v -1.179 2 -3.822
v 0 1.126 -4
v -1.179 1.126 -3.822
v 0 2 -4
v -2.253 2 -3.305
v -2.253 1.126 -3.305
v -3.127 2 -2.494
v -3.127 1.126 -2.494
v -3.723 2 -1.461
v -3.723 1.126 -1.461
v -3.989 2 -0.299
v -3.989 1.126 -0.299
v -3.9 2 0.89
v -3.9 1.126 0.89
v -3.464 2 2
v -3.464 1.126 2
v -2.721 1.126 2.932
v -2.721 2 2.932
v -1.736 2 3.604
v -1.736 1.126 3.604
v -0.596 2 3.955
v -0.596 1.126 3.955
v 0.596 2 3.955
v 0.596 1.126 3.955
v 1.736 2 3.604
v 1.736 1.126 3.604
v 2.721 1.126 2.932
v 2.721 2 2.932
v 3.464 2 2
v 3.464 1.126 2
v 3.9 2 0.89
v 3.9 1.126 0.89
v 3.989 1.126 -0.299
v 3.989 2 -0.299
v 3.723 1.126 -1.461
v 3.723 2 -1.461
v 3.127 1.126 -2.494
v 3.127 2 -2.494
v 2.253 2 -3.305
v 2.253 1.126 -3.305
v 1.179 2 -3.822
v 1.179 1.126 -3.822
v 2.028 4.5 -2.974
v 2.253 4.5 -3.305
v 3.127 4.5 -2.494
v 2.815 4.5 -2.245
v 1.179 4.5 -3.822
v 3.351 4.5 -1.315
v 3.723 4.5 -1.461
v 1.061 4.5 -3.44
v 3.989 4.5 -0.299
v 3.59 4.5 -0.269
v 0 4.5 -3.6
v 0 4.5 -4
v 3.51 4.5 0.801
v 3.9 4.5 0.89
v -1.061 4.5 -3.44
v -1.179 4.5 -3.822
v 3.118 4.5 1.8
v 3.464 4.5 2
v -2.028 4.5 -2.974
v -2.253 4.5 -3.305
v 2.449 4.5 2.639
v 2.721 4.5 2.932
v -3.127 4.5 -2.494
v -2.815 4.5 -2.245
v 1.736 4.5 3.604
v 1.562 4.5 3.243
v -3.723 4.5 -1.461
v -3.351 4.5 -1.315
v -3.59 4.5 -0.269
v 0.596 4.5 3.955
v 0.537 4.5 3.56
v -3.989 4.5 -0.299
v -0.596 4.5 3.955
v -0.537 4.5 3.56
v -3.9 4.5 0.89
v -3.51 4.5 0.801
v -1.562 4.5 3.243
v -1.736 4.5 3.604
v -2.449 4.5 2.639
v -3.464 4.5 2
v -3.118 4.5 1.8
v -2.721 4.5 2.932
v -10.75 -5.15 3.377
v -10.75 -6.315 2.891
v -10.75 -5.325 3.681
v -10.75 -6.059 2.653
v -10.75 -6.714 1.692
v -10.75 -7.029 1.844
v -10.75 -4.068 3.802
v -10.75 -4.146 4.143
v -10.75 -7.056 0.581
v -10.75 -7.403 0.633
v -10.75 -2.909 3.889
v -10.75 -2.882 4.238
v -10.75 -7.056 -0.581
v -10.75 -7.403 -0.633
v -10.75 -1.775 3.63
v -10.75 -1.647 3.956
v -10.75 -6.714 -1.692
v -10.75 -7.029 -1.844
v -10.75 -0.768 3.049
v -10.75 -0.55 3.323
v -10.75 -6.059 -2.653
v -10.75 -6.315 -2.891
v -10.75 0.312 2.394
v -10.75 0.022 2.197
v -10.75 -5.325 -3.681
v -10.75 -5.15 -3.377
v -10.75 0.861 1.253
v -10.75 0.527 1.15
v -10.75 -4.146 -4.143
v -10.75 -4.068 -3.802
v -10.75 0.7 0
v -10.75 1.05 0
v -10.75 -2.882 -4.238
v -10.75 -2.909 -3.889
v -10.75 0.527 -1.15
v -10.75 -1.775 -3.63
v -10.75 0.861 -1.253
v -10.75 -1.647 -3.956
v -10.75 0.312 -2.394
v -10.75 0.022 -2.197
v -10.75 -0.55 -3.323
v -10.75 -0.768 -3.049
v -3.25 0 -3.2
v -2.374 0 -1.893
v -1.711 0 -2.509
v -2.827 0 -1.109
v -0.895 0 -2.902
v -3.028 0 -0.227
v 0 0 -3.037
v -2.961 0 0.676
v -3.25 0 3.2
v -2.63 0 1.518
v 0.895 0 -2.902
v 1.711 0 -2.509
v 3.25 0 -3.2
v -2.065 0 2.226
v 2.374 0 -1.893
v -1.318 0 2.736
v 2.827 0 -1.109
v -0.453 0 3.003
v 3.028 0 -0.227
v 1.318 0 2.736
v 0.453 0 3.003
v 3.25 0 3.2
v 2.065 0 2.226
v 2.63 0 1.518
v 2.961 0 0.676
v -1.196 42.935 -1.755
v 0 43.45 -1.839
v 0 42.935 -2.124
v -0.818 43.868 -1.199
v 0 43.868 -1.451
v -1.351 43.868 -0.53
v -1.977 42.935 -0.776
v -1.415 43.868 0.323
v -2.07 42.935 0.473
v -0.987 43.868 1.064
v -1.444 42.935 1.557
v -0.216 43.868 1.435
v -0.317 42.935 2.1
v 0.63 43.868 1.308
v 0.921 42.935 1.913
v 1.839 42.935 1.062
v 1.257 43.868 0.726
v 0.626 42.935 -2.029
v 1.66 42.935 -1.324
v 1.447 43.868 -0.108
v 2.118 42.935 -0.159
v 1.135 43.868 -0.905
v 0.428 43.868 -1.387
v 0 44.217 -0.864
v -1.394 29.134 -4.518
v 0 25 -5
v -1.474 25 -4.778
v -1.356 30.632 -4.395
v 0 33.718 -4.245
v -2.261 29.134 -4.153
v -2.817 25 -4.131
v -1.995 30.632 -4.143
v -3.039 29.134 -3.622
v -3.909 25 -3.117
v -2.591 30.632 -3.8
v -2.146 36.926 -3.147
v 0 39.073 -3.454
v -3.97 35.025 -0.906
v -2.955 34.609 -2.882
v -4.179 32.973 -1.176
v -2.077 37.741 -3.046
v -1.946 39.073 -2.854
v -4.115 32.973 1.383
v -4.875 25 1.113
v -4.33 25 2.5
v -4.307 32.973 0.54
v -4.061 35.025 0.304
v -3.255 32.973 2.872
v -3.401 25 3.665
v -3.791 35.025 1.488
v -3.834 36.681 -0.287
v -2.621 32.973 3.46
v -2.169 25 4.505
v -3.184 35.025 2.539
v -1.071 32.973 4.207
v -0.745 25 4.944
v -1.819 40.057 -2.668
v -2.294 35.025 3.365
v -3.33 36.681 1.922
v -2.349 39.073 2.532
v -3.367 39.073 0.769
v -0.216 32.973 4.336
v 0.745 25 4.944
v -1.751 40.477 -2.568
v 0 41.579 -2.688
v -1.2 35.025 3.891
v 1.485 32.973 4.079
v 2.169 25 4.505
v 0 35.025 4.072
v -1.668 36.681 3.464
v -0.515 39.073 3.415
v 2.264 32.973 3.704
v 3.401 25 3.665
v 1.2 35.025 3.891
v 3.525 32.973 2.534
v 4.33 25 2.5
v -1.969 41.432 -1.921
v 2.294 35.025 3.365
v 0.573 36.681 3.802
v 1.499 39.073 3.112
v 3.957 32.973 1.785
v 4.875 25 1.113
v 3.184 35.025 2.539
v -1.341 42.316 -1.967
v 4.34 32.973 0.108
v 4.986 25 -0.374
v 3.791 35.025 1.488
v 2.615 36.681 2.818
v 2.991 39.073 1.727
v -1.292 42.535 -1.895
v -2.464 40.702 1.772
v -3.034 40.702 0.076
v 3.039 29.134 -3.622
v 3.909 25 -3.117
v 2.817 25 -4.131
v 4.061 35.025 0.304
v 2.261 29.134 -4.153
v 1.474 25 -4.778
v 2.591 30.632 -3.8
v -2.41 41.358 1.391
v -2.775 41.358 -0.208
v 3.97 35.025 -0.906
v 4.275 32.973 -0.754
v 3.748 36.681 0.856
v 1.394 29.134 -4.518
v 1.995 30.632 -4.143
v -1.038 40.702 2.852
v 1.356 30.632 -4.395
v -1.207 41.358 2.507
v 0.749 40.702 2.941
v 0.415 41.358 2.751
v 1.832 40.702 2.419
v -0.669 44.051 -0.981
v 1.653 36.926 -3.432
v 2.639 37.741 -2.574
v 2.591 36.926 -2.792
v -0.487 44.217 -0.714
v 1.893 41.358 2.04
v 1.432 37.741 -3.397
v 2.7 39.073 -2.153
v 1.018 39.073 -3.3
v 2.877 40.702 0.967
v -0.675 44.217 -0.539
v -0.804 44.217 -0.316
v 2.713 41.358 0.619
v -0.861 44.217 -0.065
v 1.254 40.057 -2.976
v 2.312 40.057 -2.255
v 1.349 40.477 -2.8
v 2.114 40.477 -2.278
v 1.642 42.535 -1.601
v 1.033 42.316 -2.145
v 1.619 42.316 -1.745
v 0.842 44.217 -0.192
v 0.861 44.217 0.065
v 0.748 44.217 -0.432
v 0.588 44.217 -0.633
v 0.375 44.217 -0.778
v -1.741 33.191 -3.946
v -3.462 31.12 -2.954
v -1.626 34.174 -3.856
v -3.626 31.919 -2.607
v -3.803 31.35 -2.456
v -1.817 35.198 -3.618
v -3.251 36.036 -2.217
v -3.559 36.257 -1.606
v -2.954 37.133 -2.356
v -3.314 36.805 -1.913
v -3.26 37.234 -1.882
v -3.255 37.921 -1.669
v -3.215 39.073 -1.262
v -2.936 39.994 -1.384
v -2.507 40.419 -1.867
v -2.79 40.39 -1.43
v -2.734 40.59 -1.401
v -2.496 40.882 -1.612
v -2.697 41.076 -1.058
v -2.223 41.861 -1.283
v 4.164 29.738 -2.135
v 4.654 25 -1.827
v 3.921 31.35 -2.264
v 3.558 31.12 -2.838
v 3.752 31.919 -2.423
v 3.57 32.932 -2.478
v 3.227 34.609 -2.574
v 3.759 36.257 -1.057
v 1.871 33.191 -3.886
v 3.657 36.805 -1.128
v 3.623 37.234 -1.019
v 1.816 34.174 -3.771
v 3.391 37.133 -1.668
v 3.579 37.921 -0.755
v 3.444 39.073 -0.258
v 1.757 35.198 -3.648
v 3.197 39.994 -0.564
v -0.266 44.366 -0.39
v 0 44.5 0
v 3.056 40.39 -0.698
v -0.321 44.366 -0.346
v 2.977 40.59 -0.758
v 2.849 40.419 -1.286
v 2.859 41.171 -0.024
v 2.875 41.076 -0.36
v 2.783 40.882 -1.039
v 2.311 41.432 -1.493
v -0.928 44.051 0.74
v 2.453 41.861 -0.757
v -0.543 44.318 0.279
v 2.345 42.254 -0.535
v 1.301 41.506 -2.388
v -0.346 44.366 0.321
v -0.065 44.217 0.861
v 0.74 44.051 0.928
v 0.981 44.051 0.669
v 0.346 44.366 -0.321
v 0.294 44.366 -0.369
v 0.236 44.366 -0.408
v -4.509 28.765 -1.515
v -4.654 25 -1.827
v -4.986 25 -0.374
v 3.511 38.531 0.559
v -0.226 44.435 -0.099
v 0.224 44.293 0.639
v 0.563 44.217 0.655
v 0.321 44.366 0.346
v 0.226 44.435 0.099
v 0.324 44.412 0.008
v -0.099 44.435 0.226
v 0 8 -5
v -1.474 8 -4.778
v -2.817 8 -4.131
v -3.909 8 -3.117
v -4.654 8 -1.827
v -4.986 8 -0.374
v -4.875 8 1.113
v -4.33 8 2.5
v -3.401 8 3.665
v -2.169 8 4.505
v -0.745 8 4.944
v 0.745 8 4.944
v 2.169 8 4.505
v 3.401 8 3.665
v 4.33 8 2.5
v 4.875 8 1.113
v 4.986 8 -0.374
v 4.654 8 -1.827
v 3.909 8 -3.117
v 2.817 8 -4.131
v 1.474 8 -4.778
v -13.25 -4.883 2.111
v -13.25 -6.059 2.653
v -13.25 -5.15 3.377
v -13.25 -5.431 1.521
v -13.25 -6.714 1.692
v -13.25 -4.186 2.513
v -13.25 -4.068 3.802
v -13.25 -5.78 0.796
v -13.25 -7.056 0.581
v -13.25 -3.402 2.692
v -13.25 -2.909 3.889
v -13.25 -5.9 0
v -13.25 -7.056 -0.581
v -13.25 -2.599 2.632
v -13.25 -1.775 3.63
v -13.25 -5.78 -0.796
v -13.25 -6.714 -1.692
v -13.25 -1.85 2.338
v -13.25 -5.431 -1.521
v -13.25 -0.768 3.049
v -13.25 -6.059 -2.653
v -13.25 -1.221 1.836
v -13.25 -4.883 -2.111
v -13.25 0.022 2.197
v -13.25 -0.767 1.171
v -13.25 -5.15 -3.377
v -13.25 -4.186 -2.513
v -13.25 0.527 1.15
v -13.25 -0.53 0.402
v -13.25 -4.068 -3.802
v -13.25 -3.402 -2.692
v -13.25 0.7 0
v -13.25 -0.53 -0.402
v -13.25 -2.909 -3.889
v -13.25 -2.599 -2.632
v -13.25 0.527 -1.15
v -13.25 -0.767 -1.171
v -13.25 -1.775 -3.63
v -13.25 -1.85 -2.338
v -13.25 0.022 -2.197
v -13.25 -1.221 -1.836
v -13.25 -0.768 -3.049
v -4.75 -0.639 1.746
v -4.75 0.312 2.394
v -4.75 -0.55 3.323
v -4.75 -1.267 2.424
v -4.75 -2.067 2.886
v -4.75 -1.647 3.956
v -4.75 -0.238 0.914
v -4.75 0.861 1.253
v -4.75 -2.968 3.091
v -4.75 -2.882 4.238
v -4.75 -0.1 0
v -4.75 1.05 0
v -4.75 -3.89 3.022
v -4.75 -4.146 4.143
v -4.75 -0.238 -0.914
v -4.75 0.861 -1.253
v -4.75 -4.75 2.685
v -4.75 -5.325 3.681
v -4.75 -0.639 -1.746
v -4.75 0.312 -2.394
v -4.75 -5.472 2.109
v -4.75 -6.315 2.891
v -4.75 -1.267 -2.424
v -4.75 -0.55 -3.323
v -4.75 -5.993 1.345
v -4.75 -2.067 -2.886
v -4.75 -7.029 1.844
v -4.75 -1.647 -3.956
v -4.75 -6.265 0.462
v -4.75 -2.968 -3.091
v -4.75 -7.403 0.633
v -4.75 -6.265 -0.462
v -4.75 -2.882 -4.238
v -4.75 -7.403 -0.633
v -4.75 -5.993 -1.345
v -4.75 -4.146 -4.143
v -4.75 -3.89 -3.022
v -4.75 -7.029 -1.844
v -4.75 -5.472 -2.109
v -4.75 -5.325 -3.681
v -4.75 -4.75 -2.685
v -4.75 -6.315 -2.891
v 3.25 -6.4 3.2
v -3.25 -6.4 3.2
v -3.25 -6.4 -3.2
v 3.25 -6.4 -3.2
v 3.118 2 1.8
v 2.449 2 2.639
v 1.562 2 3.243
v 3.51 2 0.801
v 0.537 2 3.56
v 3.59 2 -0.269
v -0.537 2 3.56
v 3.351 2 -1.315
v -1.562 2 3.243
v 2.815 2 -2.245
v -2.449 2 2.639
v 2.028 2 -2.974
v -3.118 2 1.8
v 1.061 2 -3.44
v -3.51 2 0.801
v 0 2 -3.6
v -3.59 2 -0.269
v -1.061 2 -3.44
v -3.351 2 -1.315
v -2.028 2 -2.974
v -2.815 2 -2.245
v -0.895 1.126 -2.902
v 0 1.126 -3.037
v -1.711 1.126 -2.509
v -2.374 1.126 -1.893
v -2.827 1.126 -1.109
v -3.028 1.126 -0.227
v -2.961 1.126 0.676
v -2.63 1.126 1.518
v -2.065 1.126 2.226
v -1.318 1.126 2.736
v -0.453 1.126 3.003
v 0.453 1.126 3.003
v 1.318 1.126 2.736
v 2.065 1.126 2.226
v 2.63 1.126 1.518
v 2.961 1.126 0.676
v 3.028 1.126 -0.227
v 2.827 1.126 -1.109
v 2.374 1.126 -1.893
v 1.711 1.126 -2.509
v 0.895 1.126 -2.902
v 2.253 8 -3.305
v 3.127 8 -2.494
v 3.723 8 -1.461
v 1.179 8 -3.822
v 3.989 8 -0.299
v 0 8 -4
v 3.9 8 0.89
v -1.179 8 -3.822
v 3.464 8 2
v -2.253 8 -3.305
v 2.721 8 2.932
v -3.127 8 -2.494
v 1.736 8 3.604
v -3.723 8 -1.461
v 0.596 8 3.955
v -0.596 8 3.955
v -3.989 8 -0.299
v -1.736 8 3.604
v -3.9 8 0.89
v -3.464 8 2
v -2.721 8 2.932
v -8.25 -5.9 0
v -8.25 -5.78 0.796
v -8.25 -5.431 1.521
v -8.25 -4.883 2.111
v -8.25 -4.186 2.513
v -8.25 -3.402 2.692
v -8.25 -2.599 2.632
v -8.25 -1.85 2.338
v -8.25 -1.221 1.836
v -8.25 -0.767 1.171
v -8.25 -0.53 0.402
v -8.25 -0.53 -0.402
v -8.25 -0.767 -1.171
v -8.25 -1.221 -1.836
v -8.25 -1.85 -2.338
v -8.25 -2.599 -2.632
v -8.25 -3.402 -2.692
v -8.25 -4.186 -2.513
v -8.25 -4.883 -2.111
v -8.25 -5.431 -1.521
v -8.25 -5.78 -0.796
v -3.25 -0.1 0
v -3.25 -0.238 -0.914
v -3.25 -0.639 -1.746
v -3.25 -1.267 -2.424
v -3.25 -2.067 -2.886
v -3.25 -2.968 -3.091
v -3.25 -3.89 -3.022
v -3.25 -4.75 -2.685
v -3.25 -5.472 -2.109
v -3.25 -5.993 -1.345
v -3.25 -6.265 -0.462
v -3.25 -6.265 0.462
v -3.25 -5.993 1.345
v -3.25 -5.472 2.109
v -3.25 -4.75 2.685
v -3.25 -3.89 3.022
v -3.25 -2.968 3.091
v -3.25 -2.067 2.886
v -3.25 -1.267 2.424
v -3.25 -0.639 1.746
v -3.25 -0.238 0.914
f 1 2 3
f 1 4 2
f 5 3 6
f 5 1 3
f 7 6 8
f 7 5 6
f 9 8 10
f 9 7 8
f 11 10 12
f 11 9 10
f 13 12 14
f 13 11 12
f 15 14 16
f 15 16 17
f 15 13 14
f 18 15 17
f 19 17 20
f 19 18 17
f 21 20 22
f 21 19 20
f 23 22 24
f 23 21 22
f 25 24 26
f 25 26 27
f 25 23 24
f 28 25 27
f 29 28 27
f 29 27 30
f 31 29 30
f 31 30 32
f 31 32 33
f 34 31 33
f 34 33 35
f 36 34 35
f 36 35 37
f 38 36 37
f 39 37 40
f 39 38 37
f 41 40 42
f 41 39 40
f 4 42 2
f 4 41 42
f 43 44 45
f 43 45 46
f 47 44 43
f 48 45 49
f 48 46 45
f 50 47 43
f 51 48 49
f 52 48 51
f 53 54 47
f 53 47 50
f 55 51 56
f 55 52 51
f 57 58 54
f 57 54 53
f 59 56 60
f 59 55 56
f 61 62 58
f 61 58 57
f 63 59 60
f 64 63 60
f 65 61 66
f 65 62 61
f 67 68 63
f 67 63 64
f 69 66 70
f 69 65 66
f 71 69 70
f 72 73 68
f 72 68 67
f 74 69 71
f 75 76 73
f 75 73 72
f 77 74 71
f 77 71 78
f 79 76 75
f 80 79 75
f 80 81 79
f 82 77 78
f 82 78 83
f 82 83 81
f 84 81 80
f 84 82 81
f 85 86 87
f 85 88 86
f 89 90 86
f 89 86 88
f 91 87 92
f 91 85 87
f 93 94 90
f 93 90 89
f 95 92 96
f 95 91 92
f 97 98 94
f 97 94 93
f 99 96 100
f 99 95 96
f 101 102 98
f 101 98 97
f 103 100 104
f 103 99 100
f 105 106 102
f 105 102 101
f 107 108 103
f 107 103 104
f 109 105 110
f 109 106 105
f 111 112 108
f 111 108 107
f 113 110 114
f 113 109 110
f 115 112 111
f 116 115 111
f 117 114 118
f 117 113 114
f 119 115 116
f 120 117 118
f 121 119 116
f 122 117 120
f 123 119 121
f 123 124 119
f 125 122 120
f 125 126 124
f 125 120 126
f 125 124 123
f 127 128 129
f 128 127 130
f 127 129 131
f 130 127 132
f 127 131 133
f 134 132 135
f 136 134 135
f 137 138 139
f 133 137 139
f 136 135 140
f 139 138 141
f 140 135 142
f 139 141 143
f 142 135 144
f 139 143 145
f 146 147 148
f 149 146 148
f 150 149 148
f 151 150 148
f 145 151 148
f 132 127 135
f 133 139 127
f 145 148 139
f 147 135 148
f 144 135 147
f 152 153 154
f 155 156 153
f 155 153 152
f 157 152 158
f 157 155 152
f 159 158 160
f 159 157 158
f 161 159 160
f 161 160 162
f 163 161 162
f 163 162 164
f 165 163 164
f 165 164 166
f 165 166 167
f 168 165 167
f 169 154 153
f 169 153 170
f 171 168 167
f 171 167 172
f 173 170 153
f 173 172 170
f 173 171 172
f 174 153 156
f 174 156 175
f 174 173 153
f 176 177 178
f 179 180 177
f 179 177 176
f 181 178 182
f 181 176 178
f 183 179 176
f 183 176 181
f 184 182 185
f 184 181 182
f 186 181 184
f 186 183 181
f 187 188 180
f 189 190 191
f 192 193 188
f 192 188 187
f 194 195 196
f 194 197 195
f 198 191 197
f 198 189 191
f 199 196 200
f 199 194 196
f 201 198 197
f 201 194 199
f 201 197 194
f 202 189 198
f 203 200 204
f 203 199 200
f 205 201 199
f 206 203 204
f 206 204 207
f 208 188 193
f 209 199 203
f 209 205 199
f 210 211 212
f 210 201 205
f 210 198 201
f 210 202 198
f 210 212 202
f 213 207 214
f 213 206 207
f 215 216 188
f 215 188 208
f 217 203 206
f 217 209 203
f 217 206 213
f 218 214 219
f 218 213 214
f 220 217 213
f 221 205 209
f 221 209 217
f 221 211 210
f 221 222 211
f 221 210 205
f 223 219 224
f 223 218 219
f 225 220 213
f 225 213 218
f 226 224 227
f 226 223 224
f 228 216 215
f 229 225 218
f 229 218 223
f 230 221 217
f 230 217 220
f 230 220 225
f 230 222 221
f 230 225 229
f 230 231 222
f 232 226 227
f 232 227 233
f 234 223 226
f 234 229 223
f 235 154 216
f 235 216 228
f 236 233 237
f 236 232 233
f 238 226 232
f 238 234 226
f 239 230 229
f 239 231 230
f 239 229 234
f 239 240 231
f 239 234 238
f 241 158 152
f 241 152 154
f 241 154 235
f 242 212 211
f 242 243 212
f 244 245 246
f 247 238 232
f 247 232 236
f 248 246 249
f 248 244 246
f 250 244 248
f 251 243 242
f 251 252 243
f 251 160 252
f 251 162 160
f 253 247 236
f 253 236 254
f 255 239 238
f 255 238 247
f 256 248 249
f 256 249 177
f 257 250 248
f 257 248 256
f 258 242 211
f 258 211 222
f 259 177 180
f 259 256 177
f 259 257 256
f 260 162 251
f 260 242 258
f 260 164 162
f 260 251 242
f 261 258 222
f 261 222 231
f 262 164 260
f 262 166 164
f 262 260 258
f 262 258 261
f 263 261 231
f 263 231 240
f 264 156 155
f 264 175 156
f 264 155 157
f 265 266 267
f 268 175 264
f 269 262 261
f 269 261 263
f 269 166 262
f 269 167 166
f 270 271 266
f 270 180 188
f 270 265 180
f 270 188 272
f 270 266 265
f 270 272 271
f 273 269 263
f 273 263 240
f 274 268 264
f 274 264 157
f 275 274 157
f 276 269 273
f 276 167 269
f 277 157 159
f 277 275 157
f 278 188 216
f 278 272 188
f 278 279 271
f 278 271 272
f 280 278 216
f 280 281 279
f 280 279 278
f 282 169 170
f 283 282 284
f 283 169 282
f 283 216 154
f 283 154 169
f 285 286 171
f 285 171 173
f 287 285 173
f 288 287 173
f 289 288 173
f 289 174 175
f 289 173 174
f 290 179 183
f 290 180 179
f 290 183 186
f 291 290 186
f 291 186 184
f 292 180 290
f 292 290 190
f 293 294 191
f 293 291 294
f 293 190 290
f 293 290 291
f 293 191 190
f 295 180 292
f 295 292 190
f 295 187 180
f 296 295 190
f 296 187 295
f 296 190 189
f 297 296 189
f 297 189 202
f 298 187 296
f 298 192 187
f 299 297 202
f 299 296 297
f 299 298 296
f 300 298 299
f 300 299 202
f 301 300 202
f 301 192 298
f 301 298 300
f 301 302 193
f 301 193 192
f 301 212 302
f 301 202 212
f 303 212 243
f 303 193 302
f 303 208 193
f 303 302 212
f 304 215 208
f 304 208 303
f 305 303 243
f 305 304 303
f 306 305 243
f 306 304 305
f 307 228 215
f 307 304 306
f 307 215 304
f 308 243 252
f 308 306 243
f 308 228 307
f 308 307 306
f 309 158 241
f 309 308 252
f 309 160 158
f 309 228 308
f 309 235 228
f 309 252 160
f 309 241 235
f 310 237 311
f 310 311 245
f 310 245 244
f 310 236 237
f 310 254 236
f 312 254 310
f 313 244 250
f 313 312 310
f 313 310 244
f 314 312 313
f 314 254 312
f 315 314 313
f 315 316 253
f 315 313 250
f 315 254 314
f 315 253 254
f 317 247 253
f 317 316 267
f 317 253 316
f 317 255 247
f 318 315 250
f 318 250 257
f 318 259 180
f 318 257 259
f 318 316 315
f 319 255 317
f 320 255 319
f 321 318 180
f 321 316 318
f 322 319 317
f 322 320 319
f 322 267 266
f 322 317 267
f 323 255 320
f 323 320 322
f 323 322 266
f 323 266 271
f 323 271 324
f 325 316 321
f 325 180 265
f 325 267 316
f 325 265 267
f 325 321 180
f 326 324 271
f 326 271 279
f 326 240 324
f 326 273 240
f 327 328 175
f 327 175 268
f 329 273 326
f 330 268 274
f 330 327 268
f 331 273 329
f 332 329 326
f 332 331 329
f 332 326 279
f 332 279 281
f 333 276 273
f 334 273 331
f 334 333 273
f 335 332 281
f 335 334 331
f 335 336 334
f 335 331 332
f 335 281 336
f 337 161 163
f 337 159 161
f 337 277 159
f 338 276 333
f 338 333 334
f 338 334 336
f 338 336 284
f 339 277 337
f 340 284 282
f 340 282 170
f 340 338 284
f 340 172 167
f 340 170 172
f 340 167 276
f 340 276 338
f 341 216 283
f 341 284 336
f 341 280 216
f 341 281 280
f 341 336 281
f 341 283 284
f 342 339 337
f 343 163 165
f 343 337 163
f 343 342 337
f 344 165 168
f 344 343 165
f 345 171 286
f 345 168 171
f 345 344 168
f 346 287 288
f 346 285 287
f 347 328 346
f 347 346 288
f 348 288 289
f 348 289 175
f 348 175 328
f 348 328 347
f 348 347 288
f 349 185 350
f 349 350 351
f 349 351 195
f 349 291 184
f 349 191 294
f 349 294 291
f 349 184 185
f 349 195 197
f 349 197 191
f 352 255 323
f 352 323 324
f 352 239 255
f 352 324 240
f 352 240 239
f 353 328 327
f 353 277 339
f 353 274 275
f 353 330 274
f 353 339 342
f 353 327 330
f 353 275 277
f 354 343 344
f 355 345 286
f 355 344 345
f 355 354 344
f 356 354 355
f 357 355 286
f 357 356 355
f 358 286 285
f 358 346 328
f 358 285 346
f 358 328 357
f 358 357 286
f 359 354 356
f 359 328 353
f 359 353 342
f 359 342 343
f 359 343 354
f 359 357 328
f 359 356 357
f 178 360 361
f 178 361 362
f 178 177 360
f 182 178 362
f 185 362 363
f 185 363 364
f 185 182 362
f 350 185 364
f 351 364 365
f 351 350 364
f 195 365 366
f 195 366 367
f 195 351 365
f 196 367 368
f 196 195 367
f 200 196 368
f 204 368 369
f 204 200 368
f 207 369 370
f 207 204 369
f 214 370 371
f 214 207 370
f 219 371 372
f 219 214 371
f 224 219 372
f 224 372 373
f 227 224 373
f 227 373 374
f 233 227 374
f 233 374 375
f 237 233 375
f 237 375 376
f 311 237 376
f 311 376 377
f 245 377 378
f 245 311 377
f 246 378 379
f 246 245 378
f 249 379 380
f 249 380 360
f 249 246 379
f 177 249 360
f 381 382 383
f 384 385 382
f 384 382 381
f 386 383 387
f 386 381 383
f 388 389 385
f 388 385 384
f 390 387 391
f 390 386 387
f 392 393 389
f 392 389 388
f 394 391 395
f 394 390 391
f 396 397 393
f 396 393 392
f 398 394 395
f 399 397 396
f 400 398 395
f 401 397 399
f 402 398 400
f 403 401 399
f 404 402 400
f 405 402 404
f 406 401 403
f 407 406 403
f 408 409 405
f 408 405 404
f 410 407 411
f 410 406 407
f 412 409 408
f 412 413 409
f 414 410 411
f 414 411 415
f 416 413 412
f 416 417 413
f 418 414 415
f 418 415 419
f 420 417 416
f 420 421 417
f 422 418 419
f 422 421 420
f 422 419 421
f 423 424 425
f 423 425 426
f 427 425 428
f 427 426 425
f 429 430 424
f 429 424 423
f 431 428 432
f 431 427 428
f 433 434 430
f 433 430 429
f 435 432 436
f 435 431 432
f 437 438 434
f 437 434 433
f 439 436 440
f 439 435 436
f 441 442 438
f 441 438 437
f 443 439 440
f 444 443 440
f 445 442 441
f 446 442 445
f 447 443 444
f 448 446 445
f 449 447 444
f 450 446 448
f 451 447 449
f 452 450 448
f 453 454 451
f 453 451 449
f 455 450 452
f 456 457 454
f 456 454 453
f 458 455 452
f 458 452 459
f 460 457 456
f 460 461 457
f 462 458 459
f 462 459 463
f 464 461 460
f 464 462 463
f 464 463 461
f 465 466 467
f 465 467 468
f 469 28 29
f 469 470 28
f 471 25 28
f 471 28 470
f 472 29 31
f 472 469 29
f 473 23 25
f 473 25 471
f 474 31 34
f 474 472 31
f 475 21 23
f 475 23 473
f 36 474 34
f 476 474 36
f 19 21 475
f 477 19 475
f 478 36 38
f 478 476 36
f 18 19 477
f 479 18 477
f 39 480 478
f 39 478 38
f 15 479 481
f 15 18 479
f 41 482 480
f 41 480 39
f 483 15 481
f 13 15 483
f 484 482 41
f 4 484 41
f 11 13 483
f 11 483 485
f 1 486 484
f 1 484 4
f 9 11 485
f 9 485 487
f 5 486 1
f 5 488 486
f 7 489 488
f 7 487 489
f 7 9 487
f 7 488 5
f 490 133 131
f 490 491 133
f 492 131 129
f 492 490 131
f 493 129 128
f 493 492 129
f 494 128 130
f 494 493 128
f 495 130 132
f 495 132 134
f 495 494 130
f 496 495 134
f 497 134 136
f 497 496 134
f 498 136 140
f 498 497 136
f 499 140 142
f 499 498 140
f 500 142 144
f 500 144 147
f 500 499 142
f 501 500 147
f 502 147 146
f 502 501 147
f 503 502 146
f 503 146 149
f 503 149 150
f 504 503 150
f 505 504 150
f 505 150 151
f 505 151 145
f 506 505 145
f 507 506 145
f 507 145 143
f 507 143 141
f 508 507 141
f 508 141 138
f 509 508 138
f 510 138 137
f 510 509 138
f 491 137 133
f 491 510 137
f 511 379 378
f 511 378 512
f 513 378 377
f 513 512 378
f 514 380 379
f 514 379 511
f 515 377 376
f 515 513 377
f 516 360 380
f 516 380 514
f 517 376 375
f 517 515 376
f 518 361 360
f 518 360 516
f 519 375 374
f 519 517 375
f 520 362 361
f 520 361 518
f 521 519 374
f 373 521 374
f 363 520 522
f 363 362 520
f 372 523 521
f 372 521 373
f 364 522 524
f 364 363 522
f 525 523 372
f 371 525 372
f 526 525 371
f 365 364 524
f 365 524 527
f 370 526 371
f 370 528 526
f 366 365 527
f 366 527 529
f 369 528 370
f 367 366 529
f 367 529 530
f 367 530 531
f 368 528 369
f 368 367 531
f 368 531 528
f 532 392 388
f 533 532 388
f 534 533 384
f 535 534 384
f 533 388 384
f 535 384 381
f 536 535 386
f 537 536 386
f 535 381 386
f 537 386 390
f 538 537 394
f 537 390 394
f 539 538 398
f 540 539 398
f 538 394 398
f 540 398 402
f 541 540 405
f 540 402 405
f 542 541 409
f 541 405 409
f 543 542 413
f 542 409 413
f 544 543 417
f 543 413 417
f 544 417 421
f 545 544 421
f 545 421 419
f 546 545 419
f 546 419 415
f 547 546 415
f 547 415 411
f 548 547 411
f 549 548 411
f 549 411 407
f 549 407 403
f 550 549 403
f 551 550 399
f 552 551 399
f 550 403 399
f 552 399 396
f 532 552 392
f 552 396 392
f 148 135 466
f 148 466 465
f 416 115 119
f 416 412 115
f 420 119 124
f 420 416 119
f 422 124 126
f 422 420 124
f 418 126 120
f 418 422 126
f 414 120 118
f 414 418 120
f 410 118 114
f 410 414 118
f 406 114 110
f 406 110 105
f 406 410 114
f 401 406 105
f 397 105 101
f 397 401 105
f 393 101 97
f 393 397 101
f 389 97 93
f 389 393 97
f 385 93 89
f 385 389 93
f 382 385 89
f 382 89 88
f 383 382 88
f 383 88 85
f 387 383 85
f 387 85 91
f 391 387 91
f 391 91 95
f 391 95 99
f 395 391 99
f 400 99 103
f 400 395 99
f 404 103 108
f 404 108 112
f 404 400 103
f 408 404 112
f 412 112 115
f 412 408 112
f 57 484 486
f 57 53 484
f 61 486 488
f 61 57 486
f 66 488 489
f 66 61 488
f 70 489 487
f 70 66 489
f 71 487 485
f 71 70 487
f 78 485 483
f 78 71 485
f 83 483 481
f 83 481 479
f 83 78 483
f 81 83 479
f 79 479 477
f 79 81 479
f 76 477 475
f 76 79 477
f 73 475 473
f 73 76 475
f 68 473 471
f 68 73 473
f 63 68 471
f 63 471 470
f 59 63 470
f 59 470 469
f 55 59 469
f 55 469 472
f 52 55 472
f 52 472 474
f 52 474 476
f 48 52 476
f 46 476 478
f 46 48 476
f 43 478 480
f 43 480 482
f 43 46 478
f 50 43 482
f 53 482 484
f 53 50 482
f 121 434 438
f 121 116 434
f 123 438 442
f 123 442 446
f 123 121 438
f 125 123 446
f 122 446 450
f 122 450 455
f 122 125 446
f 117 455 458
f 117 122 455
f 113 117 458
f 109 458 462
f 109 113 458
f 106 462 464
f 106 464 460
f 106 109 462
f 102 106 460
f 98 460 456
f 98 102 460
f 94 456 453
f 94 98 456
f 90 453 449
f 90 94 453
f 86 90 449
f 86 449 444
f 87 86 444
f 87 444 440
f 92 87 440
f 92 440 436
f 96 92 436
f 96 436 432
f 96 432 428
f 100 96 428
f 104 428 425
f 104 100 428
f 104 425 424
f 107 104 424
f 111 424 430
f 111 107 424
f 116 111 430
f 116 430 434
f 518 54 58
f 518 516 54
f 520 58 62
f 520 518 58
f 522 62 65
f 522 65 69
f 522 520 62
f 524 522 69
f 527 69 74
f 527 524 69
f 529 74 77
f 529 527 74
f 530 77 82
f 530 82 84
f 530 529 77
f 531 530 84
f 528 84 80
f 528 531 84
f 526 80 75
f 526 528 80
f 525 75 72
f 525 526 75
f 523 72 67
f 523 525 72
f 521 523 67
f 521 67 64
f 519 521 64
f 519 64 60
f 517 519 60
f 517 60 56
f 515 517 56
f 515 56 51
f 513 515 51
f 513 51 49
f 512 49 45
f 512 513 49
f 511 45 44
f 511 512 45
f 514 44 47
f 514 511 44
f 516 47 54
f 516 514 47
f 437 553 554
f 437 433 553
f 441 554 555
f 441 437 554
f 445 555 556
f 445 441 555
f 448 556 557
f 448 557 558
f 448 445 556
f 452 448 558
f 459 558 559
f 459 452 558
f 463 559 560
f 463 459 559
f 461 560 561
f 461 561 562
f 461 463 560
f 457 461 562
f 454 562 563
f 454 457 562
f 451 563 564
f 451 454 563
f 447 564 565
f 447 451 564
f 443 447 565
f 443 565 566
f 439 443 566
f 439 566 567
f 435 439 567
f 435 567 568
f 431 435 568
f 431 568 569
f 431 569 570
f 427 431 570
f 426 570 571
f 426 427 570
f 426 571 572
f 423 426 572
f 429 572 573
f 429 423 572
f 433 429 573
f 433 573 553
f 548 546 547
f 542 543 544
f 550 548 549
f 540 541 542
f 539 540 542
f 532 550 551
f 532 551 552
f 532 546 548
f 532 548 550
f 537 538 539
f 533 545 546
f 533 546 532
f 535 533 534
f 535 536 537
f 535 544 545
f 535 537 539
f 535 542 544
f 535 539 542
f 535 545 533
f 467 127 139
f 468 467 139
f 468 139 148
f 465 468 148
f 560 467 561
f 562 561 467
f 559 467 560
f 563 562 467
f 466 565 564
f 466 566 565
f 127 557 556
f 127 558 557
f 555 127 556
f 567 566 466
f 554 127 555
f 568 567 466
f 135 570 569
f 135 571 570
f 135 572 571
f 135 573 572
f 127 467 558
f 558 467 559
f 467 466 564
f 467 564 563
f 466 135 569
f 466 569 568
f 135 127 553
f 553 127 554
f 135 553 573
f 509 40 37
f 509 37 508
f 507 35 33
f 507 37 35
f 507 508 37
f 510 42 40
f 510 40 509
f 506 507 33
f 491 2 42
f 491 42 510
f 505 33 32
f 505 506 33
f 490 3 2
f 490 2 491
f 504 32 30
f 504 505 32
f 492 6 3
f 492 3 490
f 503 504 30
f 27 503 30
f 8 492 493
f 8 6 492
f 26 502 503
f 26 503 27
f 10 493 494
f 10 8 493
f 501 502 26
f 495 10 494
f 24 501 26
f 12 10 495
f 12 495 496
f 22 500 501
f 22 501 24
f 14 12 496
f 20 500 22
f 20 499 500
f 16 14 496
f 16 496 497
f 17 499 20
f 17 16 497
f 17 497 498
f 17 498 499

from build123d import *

# Parameters (mm, degrees)
SKETCH_2_W          = 6.5
SKETCH_2_H          = 6.4
EXTRUDE_1_DEPTH     = 6.4
SKETCH_5_R          = 2.7
CUT_EXTRUDE_1_DEPTH = 5


with BuildPart() as part:
    # 草图1 → 旋转1 (revolve)
    with BuildSketch(Plane.XY, mode=Mode.PRIVATE) as revolve_1_sk:
        with BuildLine():
            Line((0, 0), (-3.036670619, 0))
            Line((-3.036670619, 0), (-3.036670619, 1.125720416))
            Line((-3.036670619, 1.125720416), (-4, 1.125720416))
            Line((-4, 1.125720416), (-4, 2))
            Line((-4, 2), (-3.6, 2))
            Line((-3.6, 2), (-3.6, 4.5))
            Line((-3.6, 4.5), (-4, 4.5))
            Line((-4, 4.5), (-4, 8))
            Line((-4, 8), (-5, 8))
            Line((-5, 8), (-5, 25))
            add(Edge.make_bspline(
                [(-5, 25), (-4.722166372, 30.033496439), (-3.774780509, 37.406959566), (-3.370776113, 40.075486719), (-1.977019792, 43.14029628), (-1.896061892, 44.030808648), (0, 44.5)],
                knots=[0, 0, 0, 0, 0.132032401, 0.478362498, 0.569488384, 1, 1, 1, 1], degree=3))
            Line((0, 44.5), (0, 0))
        make_face()
    revolve(revolve_1_sk.sketch.rotate(Axis((0, -22.695068061, 0), (0, 1, 0)), 270), axis=Axis((0, -22.695068061, 0), (0, 1, 0)))

    # 草图2 → 凸台-拉伸1 (add)
    with BuildSketch(Plane.XZ):
        Rectangle(SKETCH_2_W, SKETCH_2_H)
    extrude(amount=EXTRUDE_1_DEPTH)

    # 草图4 → 旋转4 (revolve)
    with BuildSketch(Plane.XY):
        Polygon((-3.25, -0.1), (-4.75, -0.1), (-4.75, 1.05), (-10.75, 1.05), (-10.75, 0.7), (-13.25, 0.7), (-13.25, -3.2), (-3.25, -3.2), align=None)
    revolve(axis=Axis((-3.25, -3.2, 0), (-1, 0, 0)))

    # 草图5 → 切除-拉伸1 (cut)
    with BuildSketch(Plane.ZY.offset(13.25)):
        with Locations(Location((0, -3.2, 0), (0, 0, 270))):
            Circle(SKETCH_5_R)
    extrude(amount=-CUT_EXTRUDE_1_DEPTH, mode=Mode.SUBTRACT)


solid = part.part
